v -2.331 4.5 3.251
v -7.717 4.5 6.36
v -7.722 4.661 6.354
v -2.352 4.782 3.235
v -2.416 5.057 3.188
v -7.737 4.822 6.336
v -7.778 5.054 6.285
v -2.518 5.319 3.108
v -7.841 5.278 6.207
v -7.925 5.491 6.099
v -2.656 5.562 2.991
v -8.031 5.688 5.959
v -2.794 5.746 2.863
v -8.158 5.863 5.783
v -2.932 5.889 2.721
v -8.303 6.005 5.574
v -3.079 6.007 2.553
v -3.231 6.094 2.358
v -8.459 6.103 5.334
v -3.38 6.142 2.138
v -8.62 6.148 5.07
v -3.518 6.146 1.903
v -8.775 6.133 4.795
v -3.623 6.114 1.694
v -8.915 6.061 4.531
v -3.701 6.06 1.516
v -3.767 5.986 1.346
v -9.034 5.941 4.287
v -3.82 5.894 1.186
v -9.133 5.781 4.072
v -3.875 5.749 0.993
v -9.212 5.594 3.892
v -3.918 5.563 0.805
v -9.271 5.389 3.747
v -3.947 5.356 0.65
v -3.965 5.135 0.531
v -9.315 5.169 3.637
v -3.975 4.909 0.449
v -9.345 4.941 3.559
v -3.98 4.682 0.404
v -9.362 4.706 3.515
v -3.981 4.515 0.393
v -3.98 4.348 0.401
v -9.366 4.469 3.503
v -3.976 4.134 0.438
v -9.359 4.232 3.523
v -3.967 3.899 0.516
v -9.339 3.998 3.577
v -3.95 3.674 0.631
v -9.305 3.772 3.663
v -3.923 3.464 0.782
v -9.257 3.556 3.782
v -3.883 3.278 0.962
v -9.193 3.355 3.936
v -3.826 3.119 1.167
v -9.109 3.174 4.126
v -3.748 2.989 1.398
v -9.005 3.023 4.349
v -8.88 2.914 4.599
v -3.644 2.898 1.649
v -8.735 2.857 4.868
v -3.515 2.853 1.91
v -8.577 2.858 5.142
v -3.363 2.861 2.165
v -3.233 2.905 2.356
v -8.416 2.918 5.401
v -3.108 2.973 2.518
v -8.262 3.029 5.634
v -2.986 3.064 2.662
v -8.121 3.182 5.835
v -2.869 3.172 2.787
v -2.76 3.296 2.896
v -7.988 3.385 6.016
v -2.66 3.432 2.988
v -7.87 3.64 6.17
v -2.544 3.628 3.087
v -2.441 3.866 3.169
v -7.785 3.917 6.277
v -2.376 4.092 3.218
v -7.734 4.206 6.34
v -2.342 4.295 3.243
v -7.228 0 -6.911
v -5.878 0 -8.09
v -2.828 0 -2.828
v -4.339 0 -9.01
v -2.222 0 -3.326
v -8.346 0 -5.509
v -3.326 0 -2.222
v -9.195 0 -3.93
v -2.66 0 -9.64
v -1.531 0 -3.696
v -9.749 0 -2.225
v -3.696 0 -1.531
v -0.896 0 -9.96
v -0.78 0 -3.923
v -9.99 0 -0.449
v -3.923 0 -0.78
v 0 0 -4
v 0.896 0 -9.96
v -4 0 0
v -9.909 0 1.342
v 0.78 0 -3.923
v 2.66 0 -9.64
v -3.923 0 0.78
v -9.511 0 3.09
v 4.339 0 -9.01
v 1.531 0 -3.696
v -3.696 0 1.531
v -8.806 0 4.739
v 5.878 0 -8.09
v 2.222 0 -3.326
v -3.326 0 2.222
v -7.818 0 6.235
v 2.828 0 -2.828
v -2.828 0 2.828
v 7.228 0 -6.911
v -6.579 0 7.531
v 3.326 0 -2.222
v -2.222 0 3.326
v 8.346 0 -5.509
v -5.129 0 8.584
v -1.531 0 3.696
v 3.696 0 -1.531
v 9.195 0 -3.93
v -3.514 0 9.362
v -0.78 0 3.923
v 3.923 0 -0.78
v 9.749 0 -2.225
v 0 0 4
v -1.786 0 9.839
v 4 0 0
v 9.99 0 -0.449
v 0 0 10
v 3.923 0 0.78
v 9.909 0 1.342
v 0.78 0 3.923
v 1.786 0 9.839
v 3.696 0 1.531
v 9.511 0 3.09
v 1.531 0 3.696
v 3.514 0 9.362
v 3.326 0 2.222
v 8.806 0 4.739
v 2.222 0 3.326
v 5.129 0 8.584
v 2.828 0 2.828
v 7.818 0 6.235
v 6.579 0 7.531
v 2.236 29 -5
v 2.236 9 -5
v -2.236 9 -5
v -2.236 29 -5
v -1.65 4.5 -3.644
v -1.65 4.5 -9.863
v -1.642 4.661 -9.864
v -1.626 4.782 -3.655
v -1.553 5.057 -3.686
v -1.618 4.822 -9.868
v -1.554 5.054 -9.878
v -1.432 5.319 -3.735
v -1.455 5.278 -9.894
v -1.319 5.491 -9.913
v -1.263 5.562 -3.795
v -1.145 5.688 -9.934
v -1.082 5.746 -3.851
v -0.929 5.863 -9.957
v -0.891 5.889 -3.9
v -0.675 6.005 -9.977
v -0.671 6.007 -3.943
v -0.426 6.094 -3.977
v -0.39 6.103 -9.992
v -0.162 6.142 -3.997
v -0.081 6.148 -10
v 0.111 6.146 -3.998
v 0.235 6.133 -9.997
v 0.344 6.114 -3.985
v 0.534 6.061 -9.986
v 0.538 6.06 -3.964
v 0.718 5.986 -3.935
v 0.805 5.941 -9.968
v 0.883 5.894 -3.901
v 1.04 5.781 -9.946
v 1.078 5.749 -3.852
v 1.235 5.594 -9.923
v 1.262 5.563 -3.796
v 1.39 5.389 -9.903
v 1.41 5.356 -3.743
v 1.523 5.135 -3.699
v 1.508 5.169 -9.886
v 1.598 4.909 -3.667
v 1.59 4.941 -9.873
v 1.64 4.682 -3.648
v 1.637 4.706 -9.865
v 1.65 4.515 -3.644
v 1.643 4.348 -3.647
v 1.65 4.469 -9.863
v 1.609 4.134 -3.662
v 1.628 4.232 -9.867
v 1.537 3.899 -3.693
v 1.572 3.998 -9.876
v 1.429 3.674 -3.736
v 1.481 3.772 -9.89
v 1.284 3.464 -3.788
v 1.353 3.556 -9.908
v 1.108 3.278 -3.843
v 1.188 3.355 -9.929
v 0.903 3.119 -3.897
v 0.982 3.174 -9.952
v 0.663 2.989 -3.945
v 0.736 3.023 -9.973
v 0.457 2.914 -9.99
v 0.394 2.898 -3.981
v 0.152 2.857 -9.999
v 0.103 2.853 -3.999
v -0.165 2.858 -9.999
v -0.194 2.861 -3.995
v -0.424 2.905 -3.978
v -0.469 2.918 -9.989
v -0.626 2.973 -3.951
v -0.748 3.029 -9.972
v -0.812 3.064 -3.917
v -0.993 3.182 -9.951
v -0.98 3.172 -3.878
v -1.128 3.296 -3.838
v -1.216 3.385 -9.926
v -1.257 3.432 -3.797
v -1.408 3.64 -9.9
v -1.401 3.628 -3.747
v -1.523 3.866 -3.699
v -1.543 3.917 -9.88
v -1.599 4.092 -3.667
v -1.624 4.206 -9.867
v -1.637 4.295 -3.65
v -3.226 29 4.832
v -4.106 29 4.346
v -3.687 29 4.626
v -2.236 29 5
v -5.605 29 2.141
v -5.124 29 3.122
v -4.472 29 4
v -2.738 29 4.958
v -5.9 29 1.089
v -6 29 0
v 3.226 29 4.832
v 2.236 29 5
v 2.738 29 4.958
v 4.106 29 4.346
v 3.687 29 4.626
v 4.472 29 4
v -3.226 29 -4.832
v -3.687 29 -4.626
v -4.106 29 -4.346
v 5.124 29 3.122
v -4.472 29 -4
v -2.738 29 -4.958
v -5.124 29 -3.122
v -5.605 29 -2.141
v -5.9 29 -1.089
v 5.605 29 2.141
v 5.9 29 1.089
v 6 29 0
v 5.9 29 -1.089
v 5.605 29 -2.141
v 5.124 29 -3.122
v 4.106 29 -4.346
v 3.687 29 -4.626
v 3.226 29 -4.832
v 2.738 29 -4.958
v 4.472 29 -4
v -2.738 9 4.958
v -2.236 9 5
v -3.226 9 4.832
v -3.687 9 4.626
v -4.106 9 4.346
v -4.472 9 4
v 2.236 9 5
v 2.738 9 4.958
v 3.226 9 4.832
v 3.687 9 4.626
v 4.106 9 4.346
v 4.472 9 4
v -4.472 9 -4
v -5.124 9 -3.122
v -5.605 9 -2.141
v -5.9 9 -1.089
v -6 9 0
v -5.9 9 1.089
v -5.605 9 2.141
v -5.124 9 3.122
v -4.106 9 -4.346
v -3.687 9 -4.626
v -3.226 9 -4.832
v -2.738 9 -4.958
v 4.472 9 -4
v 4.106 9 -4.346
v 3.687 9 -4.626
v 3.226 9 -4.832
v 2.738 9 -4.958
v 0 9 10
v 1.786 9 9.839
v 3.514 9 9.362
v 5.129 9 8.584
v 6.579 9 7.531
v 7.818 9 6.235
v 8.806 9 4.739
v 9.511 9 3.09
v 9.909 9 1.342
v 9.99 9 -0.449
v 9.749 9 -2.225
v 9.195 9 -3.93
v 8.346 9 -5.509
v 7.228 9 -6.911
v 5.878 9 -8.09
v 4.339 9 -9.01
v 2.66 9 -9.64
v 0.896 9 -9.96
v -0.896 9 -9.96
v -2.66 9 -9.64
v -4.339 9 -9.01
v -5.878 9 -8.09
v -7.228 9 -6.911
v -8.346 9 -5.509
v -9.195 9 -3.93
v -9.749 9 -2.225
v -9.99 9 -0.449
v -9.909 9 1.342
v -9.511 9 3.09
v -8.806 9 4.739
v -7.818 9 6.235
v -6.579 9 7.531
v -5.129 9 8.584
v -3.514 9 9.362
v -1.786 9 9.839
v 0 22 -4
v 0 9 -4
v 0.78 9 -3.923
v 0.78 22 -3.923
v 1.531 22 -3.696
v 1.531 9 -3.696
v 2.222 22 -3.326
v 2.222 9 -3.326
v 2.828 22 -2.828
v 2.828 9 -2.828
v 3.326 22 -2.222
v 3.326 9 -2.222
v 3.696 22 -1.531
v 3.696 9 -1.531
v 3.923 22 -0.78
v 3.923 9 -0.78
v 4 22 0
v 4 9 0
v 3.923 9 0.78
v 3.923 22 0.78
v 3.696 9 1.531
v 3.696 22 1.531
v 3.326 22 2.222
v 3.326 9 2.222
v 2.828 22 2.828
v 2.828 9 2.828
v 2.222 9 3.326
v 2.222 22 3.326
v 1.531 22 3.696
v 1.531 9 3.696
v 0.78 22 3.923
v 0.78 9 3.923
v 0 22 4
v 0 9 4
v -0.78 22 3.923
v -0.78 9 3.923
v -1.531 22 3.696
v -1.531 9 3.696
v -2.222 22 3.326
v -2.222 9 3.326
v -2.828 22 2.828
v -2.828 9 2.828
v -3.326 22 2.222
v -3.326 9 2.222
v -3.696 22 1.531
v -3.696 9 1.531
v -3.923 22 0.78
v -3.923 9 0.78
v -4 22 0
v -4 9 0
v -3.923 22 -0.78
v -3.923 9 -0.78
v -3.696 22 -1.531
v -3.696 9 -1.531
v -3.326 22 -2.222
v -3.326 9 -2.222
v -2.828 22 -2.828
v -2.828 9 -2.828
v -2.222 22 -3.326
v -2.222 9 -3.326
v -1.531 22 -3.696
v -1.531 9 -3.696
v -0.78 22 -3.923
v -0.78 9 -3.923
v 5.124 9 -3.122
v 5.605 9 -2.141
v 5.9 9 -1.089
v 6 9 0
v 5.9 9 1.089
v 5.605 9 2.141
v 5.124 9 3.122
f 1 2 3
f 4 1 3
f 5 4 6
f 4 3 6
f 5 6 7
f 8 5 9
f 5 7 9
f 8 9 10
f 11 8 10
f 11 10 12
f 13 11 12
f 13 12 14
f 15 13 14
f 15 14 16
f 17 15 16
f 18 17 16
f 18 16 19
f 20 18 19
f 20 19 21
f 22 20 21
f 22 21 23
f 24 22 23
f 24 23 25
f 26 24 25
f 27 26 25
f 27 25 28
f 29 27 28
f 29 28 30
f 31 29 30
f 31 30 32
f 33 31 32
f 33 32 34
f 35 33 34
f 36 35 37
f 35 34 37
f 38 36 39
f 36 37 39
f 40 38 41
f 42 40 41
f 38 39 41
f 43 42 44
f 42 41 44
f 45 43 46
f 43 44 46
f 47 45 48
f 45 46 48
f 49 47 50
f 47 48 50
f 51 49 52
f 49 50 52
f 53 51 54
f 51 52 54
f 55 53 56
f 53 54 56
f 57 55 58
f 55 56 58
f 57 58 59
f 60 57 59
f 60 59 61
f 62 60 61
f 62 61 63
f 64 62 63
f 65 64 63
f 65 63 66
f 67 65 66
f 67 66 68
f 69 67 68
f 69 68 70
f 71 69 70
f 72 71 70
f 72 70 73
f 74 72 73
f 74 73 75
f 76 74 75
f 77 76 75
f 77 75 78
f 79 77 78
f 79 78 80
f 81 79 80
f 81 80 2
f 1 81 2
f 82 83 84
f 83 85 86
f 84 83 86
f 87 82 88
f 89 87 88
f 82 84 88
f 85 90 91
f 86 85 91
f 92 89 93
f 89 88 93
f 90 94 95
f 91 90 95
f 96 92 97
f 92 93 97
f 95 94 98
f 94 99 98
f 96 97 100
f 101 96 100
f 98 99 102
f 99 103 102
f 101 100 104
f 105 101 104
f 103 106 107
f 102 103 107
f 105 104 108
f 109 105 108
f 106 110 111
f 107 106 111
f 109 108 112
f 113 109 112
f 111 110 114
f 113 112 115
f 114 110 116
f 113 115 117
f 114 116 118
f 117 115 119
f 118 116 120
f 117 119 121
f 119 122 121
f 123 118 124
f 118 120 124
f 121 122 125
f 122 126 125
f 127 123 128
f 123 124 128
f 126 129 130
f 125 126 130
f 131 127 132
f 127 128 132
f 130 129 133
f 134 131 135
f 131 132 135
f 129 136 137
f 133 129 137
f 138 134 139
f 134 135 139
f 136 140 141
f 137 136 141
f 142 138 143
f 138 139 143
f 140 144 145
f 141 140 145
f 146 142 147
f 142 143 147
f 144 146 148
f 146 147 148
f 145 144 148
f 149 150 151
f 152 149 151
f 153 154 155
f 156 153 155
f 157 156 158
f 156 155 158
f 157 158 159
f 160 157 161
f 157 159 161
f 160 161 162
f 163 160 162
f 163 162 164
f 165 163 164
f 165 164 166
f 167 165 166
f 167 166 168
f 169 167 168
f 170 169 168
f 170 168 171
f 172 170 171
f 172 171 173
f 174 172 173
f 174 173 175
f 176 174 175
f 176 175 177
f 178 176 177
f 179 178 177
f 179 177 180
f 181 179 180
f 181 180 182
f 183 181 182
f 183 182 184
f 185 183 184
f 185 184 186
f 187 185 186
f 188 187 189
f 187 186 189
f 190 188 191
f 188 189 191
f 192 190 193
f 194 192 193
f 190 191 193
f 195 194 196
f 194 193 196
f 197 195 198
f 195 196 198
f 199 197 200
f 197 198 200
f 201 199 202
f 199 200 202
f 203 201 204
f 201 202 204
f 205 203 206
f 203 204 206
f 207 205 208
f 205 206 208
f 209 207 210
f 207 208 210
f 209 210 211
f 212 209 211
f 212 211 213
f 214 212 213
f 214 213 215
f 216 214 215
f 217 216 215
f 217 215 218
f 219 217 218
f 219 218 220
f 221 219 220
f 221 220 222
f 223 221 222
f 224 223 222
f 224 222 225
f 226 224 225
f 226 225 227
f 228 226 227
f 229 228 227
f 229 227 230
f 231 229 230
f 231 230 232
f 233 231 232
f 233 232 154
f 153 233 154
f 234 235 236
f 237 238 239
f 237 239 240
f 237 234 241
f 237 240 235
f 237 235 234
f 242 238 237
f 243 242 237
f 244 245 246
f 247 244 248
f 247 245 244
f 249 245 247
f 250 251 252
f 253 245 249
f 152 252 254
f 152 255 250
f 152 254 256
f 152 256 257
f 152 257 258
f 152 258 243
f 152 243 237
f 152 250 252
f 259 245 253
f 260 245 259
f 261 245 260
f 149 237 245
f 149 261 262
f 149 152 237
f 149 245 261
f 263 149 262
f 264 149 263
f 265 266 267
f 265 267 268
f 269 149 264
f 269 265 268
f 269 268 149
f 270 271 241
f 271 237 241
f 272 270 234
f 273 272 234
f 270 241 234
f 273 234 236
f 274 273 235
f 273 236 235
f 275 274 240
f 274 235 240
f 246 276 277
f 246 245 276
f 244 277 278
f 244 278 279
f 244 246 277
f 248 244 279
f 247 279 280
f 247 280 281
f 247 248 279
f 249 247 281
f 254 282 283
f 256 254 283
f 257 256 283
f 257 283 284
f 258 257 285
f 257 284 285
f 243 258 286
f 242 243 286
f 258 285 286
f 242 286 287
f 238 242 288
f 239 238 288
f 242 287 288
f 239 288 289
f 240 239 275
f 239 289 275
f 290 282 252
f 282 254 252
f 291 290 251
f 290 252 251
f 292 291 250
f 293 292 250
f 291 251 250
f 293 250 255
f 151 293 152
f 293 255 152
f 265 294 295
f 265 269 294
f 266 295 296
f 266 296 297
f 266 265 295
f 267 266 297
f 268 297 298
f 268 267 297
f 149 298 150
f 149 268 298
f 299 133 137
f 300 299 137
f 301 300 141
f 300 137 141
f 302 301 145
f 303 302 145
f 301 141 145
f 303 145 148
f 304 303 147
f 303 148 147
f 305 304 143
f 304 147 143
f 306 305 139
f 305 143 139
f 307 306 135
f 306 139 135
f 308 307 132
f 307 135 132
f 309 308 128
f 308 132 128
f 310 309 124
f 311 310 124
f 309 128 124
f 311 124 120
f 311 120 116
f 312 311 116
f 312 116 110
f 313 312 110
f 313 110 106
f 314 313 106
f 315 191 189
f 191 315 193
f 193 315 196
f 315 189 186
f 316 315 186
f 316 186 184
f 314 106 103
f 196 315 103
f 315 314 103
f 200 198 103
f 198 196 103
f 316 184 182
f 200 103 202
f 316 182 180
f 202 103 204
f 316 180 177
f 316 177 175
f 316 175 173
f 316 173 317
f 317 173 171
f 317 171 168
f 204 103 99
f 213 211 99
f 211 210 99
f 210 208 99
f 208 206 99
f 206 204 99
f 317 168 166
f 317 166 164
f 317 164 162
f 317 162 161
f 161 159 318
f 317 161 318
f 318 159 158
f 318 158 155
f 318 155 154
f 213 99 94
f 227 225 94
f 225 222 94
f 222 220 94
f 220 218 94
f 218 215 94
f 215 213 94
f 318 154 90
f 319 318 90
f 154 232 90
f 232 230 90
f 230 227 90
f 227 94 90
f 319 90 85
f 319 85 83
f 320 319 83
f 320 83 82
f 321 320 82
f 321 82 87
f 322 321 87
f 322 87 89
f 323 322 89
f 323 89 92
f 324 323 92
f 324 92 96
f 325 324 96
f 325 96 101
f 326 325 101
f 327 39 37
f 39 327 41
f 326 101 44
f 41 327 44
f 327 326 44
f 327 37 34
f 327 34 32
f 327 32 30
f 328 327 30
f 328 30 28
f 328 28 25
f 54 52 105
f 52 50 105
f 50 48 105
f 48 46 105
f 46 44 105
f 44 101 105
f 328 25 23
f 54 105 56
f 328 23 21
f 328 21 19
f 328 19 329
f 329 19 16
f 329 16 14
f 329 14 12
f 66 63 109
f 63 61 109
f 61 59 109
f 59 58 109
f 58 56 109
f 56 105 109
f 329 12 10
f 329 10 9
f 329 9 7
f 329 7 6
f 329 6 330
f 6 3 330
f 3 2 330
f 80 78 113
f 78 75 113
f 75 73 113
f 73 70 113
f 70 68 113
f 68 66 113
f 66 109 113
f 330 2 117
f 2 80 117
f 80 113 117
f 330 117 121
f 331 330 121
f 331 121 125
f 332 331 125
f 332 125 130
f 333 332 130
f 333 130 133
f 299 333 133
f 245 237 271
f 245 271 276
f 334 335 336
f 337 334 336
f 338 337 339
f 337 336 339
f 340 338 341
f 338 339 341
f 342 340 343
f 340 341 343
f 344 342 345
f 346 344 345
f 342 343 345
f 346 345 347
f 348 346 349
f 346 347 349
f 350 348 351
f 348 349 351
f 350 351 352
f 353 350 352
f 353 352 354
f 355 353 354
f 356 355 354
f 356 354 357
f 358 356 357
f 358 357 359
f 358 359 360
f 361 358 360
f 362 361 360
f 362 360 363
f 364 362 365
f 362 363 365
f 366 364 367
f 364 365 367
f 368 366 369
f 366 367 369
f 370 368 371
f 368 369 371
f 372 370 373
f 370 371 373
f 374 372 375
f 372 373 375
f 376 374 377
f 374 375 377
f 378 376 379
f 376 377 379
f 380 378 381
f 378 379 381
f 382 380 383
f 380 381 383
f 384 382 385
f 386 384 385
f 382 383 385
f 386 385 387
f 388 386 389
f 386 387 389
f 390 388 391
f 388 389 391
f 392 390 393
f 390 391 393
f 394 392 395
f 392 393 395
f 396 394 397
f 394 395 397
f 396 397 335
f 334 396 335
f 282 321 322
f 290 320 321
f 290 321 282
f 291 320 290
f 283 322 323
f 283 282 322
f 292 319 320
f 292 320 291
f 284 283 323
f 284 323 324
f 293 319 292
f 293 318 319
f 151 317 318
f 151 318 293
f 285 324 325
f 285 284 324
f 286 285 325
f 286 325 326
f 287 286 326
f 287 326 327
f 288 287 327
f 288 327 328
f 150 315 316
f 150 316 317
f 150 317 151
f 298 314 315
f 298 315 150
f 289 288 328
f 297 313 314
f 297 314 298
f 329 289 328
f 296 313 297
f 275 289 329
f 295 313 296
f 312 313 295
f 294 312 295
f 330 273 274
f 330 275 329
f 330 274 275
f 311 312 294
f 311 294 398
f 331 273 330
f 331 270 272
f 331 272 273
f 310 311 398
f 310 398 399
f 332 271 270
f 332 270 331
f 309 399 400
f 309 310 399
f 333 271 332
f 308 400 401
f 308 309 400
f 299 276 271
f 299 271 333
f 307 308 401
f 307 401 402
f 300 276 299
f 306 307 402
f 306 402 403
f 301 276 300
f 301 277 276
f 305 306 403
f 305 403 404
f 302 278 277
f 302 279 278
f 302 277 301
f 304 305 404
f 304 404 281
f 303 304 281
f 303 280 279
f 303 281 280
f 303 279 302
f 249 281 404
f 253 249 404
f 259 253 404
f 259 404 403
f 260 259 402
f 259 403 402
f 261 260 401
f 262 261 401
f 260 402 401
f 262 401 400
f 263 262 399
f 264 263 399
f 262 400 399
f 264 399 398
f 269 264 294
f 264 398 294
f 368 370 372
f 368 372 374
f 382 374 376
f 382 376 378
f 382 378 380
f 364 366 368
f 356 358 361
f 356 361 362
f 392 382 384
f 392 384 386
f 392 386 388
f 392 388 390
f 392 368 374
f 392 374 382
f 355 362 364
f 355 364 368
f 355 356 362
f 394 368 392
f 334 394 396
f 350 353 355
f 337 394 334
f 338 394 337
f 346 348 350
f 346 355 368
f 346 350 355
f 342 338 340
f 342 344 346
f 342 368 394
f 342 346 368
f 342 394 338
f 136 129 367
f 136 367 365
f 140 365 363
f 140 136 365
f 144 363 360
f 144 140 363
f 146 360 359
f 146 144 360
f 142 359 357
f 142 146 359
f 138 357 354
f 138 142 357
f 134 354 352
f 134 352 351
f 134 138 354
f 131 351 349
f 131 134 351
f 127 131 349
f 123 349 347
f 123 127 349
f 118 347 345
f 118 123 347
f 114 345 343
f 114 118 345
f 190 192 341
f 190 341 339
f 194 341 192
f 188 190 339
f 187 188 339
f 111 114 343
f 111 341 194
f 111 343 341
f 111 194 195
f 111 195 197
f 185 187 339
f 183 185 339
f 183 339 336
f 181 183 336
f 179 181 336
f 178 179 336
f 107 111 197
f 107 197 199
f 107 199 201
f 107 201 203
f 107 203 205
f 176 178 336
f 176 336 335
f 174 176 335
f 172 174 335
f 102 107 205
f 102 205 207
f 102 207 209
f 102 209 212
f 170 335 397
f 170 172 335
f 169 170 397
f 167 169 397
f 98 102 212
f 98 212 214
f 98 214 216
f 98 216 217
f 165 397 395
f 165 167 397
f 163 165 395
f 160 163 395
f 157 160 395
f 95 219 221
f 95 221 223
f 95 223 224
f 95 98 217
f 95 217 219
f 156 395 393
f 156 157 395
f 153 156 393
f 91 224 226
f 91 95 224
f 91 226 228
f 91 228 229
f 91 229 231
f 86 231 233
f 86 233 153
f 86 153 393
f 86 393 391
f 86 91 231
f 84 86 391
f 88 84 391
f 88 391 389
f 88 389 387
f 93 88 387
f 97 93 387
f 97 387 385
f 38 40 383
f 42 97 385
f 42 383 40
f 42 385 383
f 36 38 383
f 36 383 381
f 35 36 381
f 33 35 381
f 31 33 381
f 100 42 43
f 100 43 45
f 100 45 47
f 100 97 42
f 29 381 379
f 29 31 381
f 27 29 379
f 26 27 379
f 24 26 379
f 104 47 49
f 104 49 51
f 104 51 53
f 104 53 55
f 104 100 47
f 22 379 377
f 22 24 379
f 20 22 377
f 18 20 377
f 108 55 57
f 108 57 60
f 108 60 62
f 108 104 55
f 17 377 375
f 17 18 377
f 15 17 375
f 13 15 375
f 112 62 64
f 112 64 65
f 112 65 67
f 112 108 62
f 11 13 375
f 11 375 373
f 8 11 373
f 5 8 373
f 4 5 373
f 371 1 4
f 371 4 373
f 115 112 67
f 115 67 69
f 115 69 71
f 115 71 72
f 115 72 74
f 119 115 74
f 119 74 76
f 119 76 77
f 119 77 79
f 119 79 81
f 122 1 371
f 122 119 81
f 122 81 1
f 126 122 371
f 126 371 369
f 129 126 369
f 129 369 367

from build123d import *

# Parameters (mm, degrees)
SKETCH1_R              = 10
SKETCH1_R_2            = 4
BOSS_EXTRUDE1_DEPTH    = 9
BOSS_EXTRUDE2_DEPTH    = 20
SKETCH5_R              = 4
CUT_EXTRUDE3_DEPTH     = 13
FILLET1_R              = 3
M4_TAPPED_HOLE1_REACH  = 35.17
M4_TAPPED_HOLE1_BORE_R = 1.65
CIRPATTERN1_COUNT      = 2
CIRPATTERN1_ANGLE      = 120


with BuildPart() as part:
    # Sketch1 → Boss-Extrude1 (new body)
    with BuildSketch(Plane(origin=(0, 0, 0), x_dir=(1, 0, 0), z_dir=(0, 1, 0))):
        with Locations(Location((0, 0, 0), (0, 0, 270))):
            Circle(SKETCH1_R)
        with Locations(Location((0, 0, 0), (0, 0, 270))):
            Circle(SKETCH1_R_2, mode=Mode.SUBTRACT)
    extrude(amount=BOSS_EXTRUDE1_DEPTH)

    # Sketch4 → Boss-Extrude2 (add)
    with BuildSketch(Plane(origin=(0, 9, 0), x_dir=(1, 0, 0), z_dir=(0, 1, 0))):
        with BuildLine():
            Line((-3.31662479, -5), (3.31662479, -5))
            ThreePointArc((3.31662479, -5), (6, 0), (3.31662479, 5))
            Line((3.31662479, 5), (-3.31662479, 5))
            ThreePointArc((-3.31662479, 5), (-6, 0), (-3.31662479, -5))
        make_face()
    extrude(amount=BOSS_EXTRUDE2_DEPTH)

    # Sketch5 → Cut-Extrude3 (cut)
    with BuildSketch(Plane.XZ.offset(-9)):
        with Locations(Location((0, 0, 0), (0, 0, 270))):
            Circle(SKETCH5_R)
    extrude(amount=-CUT_EXTRUDE3_DEPTH, mode=Mode.SUBTRACT)

    # Fillet1
    fillet1_edges = [part.edges().sort_by_distance(p)[0] for p in [
        (3.31662479, 19, 5),
        (3.31662479, 19, -5),
        (-3.31662479, 19, -5),
        (-3.31662479, 19, 5),
    ]]
    fillet(fillet1_edges, radius=FILLET1_R)

    # M4 Tapped Hole1 bore (on position points) → M4 Tapped Hole1 (cut, up to next)
    with BuildSketch(Plane(origin=(0, 4.5, -10), x_dir=(-1, 0, 0), z_dir=(0, 0, -1)), mode=Mode.PRIVATE) as m4_tapped_hole1_sk1:
        Circle(M4_TAPPED_HOLE1_BORE_R)
    m4_tapped_hole1_tool1 = extrude(m4_tapped_hole1_sk1.sketch, amount=-M4_TAPPED_HOLE1_REACH, mode=Mode.PRIVATE) & part.part
    m4_tapped_hole1 = m4_tapped_hole1_tool1.solids().sort_by_distance((0, 4.5, -10))[0]
    add(m4_tapped_hole1, mode=Mode.SUBTRACT)

    # CirPattern1: M4 Tapped Hole1 ×2 about axis
    cirpattern1_axis = Axis((0, 9, 0), (0, 1, 0))
    for i in range(1, CIRPATTERN1_COUNT):
        add(m4_tapped_hole1.rotate(cirpattern1_axis, i * CIRPATTERN1_ANGLE / (CIRPATTERN1_COUNT - 1)), mode=Mode.SUBTRACT)


solid = part.part
